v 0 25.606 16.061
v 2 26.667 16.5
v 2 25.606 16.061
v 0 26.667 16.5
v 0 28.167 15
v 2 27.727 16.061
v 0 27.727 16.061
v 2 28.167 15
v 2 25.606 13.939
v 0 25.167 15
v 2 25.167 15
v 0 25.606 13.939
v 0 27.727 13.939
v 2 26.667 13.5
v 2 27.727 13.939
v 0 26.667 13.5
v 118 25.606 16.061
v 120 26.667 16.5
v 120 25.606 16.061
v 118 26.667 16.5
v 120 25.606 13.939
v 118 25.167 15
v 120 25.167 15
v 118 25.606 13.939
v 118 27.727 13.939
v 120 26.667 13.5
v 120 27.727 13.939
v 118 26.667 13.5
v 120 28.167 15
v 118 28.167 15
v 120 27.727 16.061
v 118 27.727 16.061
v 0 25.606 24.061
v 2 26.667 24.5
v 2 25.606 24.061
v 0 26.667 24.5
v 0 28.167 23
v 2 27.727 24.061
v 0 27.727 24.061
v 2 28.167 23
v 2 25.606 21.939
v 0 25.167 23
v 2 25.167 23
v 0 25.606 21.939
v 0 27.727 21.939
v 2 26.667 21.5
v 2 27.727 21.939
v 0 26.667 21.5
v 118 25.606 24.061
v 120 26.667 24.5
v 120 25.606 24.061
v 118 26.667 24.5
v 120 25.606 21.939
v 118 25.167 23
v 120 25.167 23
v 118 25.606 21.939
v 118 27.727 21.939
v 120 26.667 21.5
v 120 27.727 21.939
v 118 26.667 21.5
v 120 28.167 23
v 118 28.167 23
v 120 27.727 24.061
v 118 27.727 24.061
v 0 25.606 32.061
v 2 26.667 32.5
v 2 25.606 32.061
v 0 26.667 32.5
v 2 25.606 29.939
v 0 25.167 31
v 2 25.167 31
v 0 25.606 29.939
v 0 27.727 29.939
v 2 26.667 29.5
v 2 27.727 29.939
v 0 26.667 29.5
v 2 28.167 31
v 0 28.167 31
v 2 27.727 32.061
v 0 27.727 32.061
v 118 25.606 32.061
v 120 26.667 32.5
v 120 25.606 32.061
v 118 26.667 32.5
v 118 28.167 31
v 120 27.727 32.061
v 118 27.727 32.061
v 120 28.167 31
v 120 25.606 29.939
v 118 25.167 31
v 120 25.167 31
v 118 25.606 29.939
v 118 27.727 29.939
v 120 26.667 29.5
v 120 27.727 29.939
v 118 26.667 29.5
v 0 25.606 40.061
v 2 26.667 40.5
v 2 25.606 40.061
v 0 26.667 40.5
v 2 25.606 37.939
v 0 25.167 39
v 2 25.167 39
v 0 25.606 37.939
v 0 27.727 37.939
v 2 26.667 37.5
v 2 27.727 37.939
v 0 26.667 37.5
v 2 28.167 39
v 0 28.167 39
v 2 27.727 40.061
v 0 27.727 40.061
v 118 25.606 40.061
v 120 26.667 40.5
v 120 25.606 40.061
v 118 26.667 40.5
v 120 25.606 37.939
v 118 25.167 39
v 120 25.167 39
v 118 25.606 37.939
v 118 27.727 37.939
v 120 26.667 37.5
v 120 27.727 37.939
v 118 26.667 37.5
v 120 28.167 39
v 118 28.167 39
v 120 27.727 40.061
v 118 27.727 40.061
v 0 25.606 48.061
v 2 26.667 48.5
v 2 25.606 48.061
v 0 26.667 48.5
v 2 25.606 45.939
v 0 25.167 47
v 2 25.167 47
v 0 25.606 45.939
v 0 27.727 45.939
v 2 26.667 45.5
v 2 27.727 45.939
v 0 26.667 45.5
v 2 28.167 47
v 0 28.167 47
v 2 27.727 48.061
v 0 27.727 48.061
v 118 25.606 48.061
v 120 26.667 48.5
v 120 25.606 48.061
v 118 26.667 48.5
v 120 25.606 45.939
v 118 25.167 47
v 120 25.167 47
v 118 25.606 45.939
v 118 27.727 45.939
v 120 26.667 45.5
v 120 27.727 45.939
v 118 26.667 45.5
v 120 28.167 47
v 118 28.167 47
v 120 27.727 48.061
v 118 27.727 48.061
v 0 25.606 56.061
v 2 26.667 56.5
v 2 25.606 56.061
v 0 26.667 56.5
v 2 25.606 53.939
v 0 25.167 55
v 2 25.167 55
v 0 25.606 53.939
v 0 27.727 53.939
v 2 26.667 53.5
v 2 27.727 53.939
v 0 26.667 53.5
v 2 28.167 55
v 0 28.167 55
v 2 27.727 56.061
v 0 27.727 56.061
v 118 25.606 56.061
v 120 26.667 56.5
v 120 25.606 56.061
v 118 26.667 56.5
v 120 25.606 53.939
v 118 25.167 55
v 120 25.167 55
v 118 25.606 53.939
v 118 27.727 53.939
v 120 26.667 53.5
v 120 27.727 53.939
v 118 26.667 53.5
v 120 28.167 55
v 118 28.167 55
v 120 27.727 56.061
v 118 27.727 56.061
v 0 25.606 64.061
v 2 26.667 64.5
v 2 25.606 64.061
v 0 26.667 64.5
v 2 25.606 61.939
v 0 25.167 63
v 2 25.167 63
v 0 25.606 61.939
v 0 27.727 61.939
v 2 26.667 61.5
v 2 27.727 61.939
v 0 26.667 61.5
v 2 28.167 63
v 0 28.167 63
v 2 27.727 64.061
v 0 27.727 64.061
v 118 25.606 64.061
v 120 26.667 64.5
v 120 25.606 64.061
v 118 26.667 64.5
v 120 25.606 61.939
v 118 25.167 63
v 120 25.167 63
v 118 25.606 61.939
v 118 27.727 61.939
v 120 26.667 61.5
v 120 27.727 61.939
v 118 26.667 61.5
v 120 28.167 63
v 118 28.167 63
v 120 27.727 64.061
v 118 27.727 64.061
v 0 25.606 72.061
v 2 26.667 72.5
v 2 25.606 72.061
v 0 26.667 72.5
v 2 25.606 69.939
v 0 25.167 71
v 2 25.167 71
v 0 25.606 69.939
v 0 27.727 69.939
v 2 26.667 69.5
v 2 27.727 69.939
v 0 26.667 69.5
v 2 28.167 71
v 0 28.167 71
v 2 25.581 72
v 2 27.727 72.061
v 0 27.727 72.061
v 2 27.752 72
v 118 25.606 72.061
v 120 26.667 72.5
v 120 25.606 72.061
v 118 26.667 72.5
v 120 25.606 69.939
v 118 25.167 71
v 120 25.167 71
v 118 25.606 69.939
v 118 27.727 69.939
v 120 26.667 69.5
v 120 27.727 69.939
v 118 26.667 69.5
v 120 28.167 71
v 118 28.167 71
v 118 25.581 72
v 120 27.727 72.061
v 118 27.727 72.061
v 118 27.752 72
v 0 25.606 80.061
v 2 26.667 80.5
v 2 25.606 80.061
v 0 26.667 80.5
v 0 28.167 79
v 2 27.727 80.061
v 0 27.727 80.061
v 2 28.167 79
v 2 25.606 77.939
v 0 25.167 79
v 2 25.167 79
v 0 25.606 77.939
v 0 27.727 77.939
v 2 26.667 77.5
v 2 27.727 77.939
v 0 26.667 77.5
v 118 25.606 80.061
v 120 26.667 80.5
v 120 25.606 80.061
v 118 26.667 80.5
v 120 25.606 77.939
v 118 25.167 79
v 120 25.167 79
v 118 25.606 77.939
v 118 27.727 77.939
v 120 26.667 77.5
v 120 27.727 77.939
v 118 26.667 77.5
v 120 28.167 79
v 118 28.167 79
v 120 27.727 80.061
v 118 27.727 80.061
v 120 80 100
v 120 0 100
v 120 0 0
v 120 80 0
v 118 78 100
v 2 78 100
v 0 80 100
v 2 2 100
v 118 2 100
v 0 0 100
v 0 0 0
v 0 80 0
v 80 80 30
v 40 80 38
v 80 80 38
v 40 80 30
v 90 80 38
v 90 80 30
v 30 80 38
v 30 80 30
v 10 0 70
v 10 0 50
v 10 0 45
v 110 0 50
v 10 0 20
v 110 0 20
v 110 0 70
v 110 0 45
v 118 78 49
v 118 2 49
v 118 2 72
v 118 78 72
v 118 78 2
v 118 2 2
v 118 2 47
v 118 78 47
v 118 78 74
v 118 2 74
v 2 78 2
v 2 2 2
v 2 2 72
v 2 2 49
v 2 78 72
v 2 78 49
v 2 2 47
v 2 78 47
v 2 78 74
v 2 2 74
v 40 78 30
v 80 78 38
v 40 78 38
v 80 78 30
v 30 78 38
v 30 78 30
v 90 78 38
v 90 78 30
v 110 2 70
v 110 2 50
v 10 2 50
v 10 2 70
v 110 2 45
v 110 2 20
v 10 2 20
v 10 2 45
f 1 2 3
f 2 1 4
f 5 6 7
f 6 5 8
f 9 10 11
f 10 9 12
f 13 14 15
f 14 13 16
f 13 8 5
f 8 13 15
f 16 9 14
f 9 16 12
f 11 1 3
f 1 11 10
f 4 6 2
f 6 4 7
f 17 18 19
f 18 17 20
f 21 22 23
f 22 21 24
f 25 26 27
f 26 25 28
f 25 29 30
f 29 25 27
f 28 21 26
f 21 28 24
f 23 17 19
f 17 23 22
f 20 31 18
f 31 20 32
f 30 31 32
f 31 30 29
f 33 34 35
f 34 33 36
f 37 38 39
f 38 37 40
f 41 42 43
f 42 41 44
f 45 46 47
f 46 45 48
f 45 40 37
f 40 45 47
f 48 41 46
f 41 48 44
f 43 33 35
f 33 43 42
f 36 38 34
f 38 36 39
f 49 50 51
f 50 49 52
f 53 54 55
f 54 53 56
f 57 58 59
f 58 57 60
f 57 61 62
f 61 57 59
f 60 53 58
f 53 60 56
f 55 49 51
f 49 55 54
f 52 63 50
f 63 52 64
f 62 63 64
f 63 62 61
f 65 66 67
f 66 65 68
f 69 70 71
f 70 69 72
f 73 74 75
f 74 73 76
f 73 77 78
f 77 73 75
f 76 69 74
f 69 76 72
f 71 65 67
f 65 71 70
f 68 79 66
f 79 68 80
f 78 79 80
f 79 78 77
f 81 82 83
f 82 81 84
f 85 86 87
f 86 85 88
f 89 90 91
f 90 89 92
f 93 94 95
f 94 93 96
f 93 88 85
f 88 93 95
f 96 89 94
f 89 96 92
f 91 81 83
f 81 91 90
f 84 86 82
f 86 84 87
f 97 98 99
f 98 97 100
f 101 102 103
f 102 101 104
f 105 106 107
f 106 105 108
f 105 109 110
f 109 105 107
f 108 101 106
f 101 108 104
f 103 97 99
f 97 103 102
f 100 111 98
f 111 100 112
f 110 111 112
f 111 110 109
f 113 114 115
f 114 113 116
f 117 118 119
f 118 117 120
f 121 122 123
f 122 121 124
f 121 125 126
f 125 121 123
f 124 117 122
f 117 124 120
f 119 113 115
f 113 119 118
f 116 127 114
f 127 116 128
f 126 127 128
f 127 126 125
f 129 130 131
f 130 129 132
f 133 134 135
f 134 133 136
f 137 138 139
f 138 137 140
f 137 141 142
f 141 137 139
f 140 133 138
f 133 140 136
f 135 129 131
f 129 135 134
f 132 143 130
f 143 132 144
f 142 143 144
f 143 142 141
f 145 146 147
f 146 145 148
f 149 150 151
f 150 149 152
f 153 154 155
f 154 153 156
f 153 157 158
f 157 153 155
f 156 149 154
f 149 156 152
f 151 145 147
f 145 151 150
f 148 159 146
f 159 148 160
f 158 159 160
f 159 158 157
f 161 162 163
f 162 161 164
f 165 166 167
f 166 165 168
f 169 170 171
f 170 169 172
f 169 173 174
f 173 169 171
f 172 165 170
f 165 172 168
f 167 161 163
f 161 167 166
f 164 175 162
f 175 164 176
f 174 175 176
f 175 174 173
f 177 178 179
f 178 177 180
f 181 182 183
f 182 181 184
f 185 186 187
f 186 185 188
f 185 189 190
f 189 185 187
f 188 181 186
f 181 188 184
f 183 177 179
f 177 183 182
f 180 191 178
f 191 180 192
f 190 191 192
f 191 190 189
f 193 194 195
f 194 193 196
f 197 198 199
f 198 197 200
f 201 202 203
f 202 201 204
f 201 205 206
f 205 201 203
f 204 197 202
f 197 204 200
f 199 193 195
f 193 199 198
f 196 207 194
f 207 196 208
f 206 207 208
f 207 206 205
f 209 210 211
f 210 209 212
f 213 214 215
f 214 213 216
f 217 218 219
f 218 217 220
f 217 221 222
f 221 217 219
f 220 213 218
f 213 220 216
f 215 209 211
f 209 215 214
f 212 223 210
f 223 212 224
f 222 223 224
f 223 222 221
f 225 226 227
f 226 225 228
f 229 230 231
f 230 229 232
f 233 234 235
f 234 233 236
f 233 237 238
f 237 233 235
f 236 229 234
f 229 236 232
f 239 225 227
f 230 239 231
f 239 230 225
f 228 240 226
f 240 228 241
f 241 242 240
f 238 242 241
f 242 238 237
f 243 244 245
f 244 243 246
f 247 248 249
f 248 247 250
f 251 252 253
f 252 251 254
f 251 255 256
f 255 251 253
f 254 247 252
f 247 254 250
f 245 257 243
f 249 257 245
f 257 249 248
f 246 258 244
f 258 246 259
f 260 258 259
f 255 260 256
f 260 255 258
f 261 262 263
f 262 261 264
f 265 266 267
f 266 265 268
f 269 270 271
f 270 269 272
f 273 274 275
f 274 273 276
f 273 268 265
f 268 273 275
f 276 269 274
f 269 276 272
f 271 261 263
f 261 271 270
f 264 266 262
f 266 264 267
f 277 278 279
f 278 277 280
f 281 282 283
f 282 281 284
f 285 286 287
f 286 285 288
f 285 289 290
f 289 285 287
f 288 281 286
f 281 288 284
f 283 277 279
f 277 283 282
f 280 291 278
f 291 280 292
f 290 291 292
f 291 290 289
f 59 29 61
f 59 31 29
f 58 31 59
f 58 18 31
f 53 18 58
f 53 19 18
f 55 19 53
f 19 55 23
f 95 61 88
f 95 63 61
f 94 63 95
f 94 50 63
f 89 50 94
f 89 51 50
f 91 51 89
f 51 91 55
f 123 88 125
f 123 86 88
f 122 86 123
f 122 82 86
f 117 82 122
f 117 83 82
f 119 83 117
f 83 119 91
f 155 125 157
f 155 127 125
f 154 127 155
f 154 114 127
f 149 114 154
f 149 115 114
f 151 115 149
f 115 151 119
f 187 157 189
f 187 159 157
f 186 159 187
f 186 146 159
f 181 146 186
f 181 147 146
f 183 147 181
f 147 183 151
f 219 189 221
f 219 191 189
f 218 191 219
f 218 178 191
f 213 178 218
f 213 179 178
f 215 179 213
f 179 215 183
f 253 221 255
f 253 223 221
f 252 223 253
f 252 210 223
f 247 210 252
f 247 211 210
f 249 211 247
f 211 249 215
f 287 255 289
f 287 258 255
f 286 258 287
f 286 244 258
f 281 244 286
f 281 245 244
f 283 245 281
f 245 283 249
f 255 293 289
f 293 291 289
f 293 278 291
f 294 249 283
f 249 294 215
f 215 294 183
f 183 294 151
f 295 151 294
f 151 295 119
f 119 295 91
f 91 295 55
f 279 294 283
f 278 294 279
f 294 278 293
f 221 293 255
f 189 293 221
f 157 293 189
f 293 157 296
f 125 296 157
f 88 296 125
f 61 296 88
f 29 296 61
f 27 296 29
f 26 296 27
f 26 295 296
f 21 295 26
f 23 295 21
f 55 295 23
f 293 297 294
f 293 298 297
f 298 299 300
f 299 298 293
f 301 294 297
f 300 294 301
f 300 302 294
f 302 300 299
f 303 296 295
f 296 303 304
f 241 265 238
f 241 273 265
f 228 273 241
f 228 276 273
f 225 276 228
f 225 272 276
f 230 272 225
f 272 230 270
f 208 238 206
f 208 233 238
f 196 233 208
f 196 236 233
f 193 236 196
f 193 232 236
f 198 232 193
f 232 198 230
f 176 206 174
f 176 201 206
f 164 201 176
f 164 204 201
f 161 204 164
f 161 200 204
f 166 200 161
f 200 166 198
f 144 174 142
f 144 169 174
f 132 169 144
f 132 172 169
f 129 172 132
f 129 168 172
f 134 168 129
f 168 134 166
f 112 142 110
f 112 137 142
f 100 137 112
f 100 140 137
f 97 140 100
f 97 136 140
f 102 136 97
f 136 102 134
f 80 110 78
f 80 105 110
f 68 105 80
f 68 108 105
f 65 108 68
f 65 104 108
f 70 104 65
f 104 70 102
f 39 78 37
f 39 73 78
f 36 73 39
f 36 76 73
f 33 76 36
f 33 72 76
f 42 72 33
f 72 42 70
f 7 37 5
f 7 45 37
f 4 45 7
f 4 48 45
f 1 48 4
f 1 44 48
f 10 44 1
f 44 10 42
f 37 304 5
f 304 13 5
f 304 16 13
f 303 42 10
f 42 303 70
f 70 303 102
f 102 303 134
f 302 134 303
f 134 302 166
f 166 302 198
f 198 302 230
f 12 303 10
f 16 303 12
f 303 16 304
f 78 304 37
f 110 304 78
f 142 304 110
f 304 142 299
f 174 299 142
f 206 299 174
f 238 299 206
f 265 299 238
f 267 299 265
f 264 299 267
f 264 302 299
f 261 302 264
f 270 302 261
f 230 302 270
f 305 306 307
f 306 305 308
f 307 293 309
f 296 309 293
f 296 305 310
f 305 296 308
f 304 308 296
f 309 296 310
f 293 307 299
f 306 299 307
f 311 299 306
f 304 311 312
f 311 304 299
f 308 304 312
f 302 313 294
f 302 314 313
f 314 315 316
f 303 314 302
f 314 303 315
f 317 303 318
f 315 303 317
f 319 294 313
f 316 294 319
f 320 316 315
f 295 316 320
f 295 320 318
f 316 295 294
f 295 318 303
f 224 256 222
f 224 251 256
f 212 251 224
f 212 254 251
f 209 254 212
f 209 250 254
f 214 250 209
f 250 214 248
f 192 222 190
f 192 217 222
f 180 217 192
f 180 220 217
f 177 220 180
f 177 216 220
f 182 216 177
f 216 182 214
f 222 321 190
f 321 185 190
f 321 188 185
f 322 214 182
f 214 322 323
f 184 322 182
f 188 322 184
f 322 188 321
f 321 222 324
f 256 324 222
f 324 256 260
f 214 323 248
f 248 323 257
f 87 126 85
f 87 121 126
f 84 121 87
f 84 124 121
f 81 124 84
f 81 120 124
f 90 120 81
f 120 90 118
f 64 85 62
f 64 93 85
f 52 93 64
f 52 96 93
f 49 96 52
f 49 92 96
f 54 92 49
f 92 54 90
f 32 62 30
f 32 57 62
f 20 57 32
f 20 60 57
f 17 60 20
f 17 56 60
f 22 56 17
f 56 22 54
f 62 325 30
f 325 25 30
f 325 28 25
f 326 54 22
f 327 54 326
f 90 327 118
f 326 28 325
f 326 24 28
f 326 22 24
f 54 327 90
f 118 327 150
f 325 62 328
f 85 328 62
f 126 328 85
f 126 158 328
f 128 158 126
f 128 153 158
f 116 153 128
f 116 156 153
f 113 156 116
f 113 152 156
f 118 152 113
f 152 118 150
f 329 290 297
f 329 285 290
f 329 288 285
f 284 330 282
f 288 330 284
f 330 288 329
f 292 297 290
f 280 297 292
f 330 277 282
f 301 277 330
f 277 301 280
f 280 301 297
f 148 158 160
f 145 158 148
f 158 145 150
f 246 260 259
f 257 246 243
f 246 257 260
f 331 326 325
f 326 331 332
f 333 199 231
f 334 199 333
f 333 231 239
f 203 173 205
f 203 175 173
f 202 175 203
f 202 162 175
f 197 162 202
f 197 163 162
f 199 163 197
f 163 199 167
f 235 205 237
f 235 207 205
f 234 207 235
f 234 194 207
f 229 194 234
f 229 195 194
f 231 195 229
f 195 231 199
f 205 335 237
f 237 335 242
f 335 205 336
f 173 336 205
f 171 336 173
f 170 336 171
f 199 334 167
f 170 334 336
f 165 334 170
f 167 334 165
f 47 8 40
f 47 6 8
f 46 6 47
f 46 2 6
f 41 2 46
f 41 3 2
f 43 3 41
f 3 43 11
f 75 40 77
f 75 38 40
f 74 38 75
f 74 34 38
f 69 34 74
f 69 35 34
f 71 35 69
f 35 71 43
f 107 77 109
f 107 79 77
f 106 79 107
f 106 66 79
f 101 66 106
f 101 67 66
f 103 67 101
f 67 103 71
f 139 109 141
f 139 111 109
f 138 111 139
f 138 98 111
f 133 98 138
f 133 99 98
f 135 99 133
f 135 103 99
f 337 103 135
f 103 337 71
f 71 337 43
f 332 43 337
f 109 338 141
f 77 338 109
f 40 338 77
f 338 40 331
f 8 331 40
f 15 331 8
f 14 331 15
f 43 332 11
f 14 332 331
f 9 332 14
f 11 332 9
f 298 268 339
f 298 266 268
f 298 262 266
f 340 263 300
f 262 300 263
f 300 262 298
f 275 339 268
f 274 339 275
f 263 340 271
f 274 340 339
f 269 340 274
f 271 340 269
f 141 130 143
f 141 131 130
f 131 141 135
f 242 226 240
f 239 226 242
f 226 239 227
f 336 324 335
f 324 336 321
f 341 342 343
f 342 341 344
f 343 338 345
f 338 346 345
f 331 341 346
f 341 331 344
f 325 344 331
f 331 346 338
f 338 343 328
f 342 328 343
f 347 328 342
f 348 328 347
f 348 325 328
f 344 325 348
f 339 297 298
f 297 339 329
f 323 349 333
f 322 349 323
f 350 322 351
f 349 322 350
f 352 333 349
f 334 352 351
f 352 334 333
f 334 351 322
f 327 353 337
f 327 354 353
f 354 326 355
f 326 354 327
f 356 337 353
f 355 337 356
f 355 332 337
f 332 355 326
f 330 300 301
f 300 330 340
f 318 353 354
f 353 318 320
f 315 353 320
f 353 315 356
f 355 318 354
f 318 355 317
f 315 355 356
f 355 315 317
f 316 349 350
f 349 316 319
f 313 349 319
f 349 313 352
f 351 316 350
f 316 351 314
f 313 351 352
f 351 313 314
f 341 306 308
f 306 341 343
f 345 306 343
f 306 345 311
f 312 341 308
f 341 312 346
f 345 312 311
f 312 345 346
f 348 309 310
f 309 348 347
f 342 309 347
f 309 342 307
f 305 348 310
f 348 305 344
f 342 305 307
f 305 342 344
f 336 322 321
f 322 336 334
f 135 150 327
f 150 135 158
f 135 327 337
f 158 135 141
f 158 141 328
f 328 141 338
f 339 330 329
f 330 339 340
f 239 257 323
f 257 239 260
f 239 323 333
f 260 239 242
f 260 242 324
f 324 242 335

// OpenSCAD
// Network Equipment Rack System
// Custom rack system for network equipment including POE switches and patch panels

// Parameters
// Basic dimensions
rack_width = 120;        // Width of the rack
rack_depth = 80;         // Depth of the rack  
rack_height = 100;       // Height of the rack
wall_thickness = 2;      // Wall thickness

// Equipment parameters
poe_switch_width = 100;  // Width of POE switch cutout
poe_switch_height = 25;  // Height of POE switch cutout
patch_panel_width = 100; // Width of patch panel cutout
patch_panel_height = 20; // Height of patch panel cutout

// Ventilation
vent_hole_size = 3;      // Size of ventilation holes
vent_spacing = 8;        // Spacing between vent holes

module networking_rack() {
    difference() {
        // Main rack body
        cube([rack_width, rack_depth, rack_height]);
        
        // Interior hollow
        translate([wall_thickness, wall_thickness, wall_thickness])
            cube([rack_width - 2*wall_thickness, 
                  rack_depth - 2*wall_thickness, 
                  rack_height]);
        
        // POE switch cutout (front)
        translate([(rack_width - poe_switch_width)/2, -1, 20])
            cube([poe_switch_width, wall_thickness + 2, poe_switch_height]);
            
        // Patch panel cutout (front) 
        translate([(rack_width - patch_panel_width)/2, -1, 50])
            cube([patch_panel_width, wall_thickness + 2, patch_panel_height]);
            
        // Cable management holes (back)
        translate([rack_width/4, rack_depth - wall_thickness - 1, 30])
            cube([10, wall_thickness + 2, 8]);
        translate([3*rack_width/4 - 10, rack_depth - wall_thickness - 1, 30])
            cube([10, wall_thickness + 2, 8]);
            
        // Ventilation holes (sides)
        for (x = [15 : vent_spacing : rack_width - 15]) {
            for (z = [15 : vent_spacing : rack_height - 15]) {
                // Left side vents
                translate([-1, rack_depth/3, z])
                    rotate([0, 90, 0])
                        cylinder(d=vent_hole_size, h=wall_thickness + 2, $fn=8);
                // Right side vents        
                translate([rack_width - wall_thickness - 1, rack_depth/3, z])
                    rotate([0, 90, 0])
                        cylinder(d=vent_hole_size, h=wall_thickness + 2, $fn=8);
            }
        }
    }
    
    // Internal shelves
    translate([wall_thickness, wall_thickness, 20 + poe_switch_height + 2])
        cube([rack_width - 2*wall_thickness, rack_depth - 2*wall_thickness, 2]);
    
    translate([wall_thickness, wall_thickness, 50 + patch_panel_height + 2])
        cube([rack_width - 2*wall_thickness, rack_depth - 2*wall_thickness, 2]);
}

// Main object
networking_rack();
